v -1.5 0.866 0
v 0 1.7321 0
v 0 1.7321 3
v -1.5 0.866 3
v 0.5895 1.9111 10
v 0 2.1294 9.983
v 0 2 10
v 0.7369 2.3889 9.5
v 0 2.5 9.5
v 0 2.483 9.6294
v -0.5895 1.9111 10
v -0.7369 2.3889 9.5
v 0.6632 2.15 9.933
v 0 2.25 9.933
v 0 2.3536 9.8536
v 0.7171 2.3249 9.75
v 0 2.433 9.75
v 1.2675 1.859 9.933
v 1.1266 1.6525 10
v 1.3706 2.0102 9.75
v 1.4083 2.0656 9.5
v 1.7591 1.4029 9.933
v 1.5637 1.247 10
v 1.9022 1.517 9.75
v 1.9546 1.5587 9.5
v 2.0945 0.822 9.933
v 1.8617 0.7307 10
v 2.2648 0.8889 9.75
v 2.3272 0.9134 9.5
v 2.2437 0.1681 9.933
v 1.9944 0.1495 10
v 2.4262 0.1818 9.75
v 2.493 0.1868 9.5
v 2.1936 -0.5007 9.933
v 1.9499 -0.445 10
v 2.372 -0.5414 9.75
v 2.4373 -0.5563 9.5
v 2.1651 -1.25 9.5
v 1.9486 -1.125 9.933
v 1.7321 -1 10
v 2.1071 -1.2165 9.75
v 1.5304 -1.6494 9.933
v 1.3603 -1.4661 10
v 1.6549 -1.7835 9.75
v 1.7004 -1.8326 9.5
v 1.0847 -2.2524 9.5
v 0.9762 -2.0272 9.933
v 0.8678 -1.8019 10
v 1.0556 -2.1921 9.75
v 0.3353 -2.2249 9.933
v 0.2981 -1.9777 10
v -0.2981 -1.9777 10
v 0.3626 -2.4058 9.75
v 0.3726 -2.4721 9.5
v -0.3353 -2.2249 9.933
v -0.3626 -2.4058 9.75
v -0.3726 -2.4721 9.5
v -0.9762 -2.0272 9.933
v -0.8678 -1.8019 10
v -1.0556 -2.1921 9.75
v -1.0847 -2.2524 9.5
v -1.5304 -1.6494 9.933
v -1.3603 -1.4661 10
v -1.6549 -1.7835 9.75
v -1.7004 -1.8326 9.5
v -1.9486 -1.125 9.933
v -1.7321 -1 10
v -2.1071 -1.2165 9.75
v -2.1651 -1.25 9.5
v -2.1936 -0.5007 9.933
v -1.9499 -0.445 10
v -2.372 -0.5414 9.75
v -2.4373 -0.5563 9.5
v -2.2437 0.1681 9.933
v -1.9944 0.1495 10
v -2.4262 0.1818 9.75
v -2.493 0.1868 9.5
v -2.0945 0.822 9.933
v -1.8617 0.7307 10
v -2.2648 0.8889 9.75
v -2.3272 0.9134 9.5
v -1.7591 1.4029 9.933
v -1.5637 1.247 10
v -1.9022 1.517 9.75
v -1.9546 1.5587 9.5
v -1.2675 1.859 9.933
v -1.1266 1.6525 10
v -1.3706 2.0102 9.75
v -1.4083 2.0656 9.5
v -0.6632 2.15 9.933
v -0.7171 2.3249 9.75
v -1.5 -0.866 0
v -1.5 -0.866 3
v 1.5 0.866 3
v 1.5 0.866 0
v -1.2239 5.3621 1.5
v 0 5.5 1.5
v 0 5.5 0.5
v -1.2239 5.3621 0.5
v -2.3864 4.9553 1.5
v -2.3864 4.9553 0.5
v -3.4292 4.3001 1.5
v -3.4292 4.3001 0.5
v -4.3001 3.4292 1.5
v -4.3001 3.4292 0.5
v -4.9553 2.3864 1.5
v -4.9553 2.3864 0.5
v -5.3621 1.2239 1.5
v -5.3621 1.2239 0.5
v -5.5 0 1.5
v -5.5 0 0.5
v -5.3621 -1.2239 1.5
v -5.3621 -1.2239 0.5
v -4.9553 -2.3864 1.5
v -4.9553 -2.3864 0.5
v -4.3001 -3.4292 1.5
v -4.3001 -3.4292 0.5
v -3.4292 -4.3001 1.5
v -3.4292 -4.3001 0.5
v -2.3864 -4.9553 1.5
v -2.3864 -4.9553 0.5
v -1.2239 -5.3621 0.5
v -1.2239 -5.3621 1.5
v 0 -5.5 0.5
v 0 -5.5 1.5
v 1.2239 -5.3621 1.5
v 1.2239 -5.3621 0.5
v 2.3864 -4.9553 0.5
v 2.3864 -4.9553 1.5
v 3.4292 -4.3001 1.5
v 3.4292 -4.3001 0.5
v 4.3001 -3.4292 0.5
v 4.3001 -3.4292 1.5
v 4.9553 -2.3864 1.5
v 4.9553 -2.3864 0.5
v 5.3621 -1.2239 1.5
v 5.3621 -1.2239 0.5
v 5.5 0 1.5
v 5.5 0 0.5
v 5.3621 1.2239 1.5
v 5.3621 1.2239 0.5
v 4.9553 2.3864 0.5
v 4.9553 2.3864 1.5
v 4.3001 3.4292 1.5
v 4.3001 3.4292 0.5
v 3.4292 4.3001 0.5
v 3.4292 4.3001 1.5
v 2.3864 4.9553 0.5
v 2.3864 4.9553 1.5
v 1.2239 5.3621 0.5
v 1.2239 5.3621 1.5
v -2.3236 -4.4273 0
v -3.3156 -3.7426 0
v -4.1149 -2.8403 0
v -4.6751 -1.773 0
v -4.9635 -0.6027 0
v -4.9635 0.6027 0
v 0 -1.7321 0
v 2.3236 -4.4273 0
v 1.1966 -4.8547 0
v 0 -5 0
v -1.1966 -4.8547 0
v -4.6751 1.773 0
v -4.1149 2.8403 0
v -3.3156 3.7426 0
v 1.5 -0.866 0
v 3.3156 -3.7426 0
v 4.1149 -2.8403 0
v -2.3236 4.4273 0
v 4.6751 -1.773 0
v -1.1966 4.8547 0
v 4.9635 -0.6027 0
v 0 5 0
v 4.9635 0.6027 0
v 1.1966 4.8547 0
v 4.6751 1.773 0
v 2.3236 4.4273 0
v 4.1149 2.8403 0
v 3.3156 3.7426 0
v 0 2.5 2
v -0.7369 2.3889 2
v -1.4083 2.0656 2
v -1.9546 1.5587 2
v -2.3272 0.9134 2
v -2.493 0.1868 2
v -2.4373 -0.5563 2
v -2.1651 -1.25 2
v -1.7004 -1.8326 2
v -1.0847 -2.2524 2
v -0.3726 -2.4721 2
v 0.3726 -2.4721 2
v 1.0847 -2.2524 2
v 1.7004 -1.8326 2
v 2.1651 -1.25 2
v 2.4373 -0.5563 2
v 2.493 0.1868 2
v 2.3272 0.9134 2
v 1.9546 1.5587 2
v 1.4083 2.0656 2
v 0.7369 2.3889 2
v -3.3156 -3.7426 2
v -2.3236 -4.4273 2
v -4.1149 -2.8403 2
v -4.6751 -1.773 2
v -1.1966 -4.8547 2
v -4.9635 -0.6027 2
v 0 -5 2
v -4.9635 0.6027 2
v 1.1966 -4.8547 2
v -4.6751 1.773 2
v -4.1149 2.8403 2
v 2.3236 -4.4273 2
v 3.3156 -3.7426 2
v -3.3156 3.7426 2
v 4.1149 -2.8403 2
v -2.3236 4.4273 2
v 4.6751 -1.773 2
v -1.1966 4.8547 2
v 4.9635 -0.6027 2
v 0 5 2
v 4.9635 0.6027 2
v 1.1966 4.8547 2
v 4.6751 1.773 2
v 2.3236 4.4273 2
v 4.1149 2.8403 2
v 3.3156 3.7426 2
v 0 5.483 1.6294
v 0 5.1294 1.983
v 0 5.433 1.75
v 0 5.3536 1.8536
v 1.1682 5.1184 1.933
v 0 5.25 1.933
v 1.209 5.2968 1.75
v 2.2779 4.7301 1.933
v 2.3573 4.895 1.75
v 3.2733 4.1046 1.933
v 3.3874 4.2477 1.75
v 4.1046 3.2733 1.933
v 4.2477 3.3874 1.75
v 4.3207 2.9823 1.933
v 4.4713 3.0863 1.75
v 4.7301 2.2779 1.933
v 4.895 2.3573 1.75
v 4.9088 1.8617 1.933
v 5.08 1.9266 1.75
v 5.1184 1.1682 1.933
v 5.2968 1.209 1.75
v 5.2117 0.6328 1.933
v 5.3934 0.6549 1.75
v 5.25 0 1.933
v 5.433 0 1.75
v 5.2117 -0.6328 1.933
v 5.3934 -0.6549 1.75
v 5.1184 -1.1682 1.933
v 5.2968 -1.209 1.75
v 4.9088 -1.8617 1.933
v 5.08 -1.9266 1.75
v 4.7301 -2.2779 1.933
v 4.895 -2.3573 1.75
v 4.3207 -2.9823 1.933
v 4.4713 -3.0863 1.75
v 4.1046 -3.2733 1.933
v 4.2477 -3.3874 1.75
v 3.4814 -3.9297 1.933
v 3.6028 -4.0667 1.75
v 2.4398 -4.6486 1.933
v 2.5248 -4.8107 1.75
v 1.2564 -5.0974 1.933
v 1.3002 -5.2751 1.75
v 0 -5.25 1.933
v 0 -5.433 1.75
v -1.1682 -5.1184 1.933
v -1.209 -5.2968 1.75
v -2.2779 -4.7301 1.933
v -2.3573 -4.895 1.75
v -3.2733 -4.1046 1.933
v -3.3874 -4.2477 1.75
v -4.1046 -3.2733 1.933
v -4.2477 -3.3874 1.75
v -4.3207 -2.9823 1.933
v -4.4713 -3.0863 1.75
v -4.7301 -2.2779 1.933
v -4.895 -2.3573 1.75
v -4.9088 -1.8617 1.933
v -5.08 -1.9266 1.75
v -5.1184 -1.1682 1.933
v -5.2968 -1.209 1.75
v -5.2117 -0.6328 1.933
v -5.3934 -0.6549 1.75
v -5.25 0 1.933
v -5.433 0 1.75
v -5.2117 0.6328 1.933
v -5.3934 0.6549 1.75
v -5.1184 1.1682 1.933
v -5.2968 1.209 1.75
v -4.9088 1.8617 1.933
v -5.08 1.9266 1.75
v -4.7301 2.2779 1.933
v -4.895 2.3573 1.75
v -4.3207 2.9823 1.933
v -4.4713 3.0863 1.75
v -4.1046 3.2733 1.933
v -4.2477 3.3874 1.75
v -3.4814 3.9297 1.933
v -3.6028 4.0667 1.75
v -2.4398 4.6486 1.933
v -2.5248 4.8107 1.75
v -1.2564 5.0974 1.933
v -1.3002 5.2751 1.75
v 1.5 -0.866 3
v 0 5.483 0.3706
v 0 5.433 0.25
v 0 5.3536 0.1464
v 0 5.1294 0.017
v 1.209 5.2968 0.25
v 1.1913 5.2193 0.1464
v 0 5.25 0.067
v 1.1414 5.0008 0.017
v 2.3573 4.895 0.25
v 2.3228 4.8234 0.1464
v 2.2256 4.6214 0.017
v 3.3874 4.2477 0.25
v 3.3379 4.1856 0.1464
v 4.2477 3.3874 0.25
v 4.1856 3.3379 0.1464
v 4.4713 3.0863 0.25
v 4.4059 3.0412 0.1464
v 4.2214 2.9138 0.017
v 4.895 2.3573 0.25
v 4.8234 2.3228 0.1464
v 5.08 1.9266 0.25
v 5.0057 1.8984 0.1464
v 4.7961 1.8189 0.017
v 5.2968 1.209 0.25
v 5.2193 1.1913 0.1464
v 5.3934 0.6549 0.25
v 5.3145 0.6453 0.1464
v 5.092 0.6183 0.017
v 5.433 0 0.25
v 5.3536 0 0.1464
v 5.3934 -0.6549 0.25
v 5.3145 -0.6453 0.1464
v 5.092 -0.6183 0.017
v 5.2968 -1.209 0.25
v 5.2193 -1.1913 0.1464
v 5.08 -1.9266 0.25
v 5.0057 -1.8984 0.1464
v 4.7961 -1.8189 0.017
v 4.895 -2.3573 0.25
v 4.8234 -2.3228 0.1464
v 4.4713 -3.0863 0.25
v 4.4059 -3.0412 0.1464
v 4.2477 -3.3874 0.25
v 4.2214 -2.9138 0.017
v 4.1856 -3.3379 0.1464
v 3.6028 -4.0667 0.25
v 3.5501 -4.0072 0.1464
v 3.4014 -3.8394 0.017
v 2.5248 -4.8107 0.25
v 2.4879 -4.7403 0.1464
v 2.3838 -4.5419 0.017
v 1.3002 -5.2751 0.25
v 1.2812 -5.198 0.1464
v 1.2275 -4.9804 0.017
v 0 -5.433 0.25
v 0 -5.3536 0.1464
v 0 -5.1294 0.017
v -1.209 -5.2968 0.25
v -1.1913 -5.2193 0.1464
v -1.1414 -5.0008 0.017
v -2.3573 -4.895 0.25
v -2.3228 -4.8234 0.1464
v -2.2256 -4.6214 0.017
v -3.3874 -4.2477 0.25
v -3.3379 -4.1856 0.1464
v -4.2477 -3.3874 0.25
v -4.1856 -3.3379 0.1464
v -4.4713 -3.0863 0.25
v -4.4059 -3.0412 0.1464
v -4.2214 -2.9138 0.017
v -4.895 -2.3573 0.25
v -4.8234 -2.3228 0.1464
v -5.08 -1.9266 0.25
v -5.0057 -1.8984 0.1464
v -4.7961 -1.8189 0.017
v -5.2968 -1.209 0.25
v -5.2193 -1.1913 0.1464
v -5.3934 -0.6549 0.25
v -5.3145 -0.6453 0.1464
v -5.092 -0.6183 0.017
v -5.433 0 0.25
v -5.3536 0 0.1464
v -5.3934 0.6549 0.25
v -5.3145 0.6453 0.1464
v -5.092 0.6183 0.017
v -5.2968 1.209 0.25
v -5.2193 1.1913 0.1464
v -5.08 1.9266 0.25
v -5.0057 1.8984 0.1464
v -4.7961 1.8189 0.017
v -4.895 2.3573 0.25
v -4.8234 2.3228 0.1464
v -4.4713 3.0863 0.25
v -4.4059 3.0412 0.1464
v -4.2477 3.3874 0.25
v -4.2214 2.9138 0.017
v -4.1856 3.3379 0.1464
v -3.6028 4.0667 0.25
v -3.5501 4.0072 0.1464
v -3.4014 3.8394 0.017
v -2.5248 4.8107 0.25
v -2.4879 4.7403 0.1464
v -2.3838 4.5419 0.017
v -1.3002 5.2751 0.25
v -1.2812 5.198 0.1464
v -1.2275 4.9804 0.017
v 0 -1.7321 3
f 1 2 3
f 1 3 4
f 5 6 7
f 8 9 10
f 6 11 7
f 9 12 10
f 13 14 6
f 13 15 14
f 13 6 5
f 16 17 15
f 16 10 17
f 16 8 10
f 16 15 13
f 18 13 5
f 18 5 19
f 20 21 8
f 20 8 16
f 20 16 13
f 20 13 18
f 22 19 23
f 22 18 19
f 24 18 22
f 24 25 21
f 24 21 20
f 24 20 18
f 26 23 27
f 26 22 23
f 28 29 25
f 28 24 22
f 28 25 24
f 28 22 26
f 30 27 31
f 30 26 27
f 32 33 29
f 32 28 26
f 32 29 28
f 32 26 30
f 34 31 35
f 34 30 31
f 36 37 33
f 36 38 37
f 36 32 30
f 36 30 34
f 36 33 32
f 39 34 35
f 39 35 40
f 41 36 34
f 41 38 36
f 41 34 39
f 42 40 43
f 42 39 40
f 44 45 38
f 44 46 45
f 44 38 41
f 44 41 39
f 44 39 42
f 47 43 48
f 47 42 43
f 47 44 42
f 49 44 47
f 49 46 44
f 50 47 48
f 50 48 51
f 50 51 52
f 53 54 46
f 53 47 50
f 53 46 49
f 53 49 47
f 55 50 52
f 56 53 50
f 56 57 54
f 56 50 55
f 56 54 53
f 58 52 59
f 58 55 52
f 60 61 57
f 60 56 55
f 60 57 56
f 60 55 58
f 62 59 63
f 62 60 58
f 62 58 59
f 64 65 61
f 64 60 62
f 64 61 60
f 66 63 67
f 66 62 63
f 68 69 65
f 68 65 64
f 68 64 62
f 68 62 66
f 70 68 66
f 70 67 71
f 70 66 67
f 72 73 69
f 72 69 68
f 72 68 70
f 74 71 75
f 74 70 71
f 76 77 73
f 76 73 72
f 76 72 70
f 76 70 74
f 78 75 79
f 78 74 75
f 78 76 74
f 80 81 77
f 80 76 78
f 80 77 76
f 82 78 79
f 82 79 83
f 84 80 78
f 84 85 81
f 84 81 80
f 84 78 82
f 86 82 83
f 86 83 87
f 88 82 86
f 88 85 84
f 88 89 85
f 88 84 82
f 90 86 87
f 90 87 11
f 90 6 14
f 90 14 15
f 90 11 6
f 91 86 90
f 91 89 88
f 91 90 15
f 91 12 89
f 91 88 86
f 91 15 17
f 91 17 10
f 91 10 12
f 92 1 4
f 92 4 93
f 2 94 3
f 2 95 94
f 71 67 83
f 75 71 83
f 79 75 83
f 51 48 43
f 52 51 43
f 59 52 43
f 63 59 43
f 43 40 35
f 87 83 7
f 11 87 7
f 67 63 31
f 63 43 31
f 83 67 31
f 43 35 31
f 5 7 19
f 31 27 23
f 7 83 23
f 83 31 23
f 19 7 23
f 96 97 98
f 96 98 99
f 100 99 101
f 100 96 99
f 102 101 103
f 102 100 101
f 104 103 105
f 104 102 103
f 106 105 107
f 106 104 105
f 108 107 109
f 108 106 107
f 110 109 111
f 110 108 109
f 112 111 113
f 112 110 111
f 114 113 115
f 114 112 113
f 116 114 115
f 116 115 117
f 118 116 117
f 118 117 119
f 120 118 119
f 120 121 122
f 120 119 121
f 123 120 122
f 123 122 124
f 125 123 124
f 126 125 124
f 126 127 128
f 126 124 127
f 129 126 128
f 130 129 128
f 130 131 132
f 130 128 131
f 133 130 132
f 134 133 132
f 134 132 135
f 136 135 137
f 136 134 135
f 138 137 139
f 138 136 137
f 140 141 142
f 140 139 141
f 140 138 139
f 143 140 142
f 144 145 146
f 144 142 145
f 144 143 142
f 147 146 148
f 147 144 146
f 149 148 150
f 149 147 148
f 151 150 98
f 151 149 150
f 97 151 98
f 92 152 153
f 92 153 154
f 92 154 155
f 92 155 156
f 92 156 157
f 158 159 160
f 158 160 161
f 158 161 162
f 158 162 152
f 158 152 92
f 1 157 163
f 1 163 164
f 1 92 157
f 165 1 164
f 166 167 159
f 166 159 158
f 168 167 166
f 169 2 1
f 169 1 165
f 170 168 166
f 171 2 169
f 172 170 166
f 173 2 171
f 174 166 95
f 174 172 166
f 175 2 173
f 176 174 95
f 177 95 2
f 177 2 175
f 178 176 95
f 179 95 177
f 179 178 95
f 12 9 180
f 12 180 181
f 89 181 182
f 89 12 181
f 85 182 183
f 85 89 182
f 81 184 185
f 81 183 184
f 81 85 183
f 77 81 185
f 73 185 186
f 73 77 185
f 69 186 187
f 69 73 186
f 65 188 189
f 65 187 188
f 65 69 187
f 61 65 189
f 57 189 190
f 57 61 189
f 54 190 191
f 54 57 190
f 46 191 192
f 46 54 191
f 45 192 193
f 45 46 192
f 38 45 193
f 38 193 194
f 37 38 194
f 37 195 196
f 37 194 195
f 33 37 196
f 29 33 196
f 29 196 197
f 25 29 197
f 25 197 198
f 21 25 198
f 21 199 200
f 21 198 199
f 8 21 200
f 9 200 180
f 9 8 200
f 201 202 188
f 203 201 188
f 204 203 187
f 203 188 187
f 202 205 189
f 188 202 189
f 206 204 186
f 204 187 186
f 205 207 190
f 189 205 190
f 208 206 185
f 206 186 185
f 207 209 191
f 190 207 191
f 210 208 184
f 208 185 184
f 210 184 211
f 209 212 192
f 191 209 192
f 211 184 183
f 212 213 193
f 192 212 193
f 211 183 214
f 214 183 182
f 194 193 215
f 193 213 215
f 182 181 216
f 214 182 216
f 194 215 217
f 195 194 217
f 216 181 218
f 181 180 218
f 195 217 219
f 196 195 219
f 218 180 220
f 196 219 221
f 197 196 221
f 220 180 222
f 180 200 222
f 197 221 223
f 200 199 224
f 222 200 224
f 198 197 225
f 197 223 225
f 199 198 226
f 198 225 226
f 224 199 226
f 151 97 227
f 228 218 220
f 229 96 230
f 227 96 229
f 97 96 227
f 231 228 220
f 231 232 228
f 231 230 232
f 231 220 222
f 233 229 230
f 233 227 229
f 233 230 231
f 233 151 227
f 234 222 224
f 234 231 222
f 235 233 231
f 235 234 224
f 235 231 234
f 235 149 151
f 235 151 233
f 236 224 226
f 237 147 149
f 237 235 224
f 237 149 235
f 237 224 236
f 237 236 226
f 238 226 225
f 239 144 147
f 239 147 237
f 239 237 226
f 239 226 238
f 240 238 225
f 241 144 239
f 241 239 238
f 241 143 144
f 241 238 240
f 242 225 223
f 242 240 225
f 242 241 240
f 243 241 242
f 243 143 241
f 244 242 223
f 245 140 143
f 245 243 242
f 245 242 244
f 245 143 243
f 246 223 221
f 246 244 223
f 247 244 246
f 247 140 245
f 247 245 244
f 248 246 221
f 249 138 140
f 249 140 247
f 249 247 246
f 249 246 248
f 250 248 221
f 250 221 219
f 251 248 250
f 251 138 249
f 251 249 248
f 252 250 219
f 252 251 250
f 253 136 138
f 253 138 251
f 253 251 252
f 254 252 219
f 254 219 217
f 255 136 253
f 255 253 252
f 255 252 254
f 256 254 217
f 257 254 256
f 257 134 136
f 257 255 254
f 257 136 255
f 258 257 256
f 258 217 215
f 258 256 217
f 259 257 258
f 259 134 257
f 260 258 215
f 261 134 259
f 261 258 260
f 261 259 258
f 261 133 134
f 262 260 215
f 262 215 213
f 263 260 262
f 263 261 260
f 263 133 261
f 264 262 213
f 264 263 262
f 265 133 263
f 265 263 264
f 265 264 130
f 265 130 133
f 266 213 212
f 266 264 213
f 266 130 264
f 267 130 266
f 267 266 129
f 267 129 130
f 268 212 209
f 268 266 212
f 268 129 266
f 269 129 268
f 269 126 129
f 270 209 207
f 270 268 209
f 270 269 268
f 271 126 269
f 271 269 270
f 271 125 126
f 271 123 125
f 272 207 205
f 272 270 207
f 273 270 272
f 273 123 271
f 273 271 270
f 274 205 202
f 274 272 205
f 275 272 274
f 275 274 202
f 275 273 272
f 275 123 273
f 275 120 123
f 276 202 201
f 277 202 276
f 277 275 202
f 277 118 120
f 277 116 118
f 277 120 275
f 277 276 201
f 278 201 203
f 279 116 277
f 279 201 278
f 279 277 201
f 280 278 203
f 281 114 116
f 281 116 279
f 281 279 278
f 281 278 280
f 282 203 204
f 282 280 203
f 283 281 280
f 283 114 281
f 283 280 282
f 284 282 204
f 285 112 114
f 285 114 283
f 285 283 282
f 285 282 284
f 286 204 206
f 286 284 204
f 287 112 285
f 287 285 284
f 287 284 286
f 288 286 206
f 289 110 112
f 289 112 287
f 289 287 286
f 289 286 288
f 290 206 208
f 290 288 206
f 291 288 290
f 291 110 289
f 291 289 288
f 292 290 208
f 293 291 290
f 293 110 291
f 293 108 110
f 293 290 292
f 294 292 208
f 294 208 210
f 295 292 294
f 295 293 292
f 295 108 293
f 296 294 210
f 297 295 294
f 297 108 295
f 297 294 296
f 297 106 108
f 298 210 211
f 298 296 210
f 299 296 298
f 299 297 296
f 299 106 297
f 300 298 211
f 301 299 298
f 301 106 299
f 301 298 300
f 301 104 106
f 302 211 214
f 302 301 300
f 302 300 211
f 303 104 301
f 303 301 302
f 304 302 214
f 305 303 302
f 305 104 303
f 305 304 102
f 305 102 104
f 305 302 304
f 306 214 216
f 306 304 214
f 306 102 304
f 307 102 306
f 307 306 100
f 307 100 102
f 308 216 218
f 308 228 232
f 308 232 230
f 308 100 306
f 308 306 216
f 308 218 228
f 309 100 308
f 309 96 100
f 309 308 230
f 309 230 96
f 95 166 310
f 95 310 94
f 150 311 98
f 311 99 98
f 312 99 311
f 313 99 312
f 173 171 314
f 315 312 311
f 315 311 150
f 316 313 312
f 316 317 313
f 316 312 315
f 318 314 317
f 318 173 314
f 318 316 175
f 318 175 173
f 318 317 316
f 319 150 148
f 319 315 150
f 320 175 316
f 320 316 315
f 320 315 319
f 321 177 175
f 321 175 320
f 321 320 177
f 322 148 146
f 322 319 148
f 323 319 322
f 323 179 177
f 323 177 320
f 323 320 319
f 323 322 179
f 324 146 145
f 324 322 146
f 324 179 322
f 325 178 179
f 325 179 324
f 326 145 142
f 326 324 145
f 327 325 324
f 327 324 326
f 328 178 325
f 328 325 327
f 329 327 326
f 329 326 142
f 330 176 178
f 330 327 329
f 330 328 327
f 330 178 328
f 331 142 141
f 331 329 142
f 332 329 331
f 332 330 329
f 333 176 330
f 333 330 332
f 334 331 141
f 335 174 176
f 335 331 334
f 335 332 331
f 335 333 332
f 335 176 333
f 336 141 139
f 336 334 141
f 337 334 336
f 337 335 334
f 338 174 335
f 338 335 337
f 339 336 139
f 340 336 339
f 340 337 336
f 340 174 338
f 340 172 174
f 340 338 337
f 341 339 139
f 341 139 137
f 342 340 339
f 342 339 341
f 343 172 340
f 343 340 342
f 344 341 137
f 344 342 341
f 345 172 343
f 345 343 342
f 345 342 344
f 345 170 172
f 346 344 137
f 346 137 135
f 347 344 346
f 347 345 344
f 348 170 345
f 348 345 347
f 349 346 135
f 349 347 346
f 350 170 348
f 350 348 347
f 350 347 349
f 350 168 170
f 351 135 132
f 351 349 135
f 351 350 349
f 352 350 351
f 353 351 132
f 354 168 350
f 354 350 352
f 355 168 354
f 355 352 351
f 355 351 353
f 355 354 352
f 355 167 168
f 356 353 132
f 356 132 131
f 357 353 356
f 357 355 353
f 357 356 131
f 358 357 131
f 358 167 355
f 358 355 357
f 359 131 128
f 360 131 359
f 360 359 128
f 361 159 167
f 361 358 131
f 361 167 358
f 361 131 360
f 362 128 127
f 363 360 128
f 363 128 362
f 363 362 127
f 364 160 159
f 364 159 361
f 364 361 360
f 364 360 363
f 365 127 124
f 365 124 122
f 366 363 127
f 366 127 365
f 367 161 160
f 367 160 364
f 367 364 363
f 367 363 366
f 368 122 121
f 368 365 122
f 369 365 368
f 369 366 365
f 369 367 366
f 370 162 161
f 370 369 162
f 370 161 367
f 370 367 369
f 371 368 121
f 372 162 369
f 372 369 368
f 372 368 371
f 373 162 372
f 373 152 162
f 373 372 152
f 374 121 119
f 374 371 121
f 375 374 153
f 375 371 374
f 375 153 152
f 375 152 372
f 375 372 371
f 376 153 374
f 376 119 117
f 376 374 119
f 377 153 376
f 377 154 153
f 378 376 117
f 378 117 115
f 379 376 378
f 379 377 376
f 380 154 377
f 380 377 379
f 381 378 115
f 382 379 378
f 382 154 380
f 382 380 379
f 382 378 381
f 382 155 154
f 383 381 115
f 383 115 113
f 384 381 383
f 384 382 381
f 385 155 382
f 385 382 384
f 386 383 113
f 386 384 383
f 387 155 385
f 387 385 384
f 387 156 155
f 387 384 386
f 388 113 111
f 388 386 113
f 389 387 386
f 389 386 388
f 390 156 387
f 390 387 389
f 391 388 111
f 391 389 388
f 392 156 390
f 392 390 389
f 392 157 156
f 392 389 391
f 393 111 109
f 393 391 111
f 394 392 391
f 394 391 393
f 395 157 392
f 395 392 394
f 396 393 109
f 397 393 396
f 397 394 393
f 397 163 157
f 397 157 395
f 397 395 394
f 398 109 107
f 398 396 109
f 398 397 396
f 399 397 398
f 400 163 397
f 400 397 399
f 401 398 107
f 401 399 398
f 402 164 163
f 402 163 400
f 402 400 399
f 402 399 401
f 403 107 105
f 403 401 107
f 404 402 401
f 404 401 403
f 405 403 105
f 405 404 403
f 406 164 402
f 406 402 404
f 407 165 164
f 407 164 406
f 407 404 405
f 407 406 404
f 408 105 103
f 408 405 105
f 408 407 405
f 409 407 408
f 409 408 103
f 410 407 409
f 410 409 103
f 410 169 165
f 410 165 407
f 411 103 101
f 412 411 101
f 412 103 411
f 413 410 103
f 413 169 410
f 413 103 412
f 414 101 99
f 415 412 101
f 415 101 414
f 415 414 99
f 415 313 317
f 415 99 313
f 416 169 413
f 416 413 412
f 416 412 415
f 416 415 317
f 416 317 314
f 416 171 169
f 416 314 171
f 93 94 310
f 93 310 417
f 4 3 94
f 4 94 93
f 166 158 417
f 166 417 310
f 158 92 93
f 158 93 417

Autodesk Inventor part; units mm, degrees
ref_plane "YZ Plane" through (0, 0, 0) normal (1, 0, 0) x (0, 1, 0)
ref_plane "XZ Plane" through (0, 0, 0) normal (0, 1, 0) x (-1, 0, 0)
ref_plane "XY Plane" through (0, 0, 0) normal (0, 0, 1) x (1, 0, 0)
sketch "Sketch1" plane through (0, 0, 0) normal (1, 0, 0) x (0, 1, 0)
  line L0 (0, 0) -> (5.5, 0)
  line L1 (5.5, 0) -> (5.5, 2)
  line L2 (5.5, 2) -> (2.5, 2)
  line L3 (2.5, 2) -> (2.5, 10)
  line L4 (2.5, 10) -> (0, 10)
  line L5 (0, 10) -> (0, 0)
  dimension "d0" = 8
  dimension "d1" = 2
  dimension "d2" = 5.5
  dimension "d3" = 2.5
revolve "Revolution1" add sketch "Sketch1" angle 360 about axis through (0, 0, 10) along (0, 0, -1)
fillet "Fillet1" radius 0.5 3 edges at (0, -5.5, 0) (0, -5.5, 2) (0, -2.5, 10)
sketch "Sketch2" plane through (0, 0, 0) normal (0, 0, -1) x (-1, 0, 0)
  circle A0 centre (0, 0) radius 5 projected
  line L0 (1.5, -0.866) -> (0, -1.7321)
  line L1 (0, -1.7321) -> (-1.5, -0.866)
  line L2 (-1.5, -0.866) -> (-1.5, 0.866)
  line L3 (-1.5, 0.866) -> (0, 1.7321)
  line L4 (0, 1.7321) -> (1.5, 0.866)
  line L5 (1.5, 0.866) -> (1.5, -0.866)
  dimension "d6" = 3
extrude "Extrusion1" cut sketch "Sketch2" against normal blind 3 contours L0 L1 L2 L3 L4 L5
thread "Thread1" size "M5x0.8" class "6g" standard "ANSI Metric M Profile" length 30 offset 3
properties part number "M5x8 low profile screw"
